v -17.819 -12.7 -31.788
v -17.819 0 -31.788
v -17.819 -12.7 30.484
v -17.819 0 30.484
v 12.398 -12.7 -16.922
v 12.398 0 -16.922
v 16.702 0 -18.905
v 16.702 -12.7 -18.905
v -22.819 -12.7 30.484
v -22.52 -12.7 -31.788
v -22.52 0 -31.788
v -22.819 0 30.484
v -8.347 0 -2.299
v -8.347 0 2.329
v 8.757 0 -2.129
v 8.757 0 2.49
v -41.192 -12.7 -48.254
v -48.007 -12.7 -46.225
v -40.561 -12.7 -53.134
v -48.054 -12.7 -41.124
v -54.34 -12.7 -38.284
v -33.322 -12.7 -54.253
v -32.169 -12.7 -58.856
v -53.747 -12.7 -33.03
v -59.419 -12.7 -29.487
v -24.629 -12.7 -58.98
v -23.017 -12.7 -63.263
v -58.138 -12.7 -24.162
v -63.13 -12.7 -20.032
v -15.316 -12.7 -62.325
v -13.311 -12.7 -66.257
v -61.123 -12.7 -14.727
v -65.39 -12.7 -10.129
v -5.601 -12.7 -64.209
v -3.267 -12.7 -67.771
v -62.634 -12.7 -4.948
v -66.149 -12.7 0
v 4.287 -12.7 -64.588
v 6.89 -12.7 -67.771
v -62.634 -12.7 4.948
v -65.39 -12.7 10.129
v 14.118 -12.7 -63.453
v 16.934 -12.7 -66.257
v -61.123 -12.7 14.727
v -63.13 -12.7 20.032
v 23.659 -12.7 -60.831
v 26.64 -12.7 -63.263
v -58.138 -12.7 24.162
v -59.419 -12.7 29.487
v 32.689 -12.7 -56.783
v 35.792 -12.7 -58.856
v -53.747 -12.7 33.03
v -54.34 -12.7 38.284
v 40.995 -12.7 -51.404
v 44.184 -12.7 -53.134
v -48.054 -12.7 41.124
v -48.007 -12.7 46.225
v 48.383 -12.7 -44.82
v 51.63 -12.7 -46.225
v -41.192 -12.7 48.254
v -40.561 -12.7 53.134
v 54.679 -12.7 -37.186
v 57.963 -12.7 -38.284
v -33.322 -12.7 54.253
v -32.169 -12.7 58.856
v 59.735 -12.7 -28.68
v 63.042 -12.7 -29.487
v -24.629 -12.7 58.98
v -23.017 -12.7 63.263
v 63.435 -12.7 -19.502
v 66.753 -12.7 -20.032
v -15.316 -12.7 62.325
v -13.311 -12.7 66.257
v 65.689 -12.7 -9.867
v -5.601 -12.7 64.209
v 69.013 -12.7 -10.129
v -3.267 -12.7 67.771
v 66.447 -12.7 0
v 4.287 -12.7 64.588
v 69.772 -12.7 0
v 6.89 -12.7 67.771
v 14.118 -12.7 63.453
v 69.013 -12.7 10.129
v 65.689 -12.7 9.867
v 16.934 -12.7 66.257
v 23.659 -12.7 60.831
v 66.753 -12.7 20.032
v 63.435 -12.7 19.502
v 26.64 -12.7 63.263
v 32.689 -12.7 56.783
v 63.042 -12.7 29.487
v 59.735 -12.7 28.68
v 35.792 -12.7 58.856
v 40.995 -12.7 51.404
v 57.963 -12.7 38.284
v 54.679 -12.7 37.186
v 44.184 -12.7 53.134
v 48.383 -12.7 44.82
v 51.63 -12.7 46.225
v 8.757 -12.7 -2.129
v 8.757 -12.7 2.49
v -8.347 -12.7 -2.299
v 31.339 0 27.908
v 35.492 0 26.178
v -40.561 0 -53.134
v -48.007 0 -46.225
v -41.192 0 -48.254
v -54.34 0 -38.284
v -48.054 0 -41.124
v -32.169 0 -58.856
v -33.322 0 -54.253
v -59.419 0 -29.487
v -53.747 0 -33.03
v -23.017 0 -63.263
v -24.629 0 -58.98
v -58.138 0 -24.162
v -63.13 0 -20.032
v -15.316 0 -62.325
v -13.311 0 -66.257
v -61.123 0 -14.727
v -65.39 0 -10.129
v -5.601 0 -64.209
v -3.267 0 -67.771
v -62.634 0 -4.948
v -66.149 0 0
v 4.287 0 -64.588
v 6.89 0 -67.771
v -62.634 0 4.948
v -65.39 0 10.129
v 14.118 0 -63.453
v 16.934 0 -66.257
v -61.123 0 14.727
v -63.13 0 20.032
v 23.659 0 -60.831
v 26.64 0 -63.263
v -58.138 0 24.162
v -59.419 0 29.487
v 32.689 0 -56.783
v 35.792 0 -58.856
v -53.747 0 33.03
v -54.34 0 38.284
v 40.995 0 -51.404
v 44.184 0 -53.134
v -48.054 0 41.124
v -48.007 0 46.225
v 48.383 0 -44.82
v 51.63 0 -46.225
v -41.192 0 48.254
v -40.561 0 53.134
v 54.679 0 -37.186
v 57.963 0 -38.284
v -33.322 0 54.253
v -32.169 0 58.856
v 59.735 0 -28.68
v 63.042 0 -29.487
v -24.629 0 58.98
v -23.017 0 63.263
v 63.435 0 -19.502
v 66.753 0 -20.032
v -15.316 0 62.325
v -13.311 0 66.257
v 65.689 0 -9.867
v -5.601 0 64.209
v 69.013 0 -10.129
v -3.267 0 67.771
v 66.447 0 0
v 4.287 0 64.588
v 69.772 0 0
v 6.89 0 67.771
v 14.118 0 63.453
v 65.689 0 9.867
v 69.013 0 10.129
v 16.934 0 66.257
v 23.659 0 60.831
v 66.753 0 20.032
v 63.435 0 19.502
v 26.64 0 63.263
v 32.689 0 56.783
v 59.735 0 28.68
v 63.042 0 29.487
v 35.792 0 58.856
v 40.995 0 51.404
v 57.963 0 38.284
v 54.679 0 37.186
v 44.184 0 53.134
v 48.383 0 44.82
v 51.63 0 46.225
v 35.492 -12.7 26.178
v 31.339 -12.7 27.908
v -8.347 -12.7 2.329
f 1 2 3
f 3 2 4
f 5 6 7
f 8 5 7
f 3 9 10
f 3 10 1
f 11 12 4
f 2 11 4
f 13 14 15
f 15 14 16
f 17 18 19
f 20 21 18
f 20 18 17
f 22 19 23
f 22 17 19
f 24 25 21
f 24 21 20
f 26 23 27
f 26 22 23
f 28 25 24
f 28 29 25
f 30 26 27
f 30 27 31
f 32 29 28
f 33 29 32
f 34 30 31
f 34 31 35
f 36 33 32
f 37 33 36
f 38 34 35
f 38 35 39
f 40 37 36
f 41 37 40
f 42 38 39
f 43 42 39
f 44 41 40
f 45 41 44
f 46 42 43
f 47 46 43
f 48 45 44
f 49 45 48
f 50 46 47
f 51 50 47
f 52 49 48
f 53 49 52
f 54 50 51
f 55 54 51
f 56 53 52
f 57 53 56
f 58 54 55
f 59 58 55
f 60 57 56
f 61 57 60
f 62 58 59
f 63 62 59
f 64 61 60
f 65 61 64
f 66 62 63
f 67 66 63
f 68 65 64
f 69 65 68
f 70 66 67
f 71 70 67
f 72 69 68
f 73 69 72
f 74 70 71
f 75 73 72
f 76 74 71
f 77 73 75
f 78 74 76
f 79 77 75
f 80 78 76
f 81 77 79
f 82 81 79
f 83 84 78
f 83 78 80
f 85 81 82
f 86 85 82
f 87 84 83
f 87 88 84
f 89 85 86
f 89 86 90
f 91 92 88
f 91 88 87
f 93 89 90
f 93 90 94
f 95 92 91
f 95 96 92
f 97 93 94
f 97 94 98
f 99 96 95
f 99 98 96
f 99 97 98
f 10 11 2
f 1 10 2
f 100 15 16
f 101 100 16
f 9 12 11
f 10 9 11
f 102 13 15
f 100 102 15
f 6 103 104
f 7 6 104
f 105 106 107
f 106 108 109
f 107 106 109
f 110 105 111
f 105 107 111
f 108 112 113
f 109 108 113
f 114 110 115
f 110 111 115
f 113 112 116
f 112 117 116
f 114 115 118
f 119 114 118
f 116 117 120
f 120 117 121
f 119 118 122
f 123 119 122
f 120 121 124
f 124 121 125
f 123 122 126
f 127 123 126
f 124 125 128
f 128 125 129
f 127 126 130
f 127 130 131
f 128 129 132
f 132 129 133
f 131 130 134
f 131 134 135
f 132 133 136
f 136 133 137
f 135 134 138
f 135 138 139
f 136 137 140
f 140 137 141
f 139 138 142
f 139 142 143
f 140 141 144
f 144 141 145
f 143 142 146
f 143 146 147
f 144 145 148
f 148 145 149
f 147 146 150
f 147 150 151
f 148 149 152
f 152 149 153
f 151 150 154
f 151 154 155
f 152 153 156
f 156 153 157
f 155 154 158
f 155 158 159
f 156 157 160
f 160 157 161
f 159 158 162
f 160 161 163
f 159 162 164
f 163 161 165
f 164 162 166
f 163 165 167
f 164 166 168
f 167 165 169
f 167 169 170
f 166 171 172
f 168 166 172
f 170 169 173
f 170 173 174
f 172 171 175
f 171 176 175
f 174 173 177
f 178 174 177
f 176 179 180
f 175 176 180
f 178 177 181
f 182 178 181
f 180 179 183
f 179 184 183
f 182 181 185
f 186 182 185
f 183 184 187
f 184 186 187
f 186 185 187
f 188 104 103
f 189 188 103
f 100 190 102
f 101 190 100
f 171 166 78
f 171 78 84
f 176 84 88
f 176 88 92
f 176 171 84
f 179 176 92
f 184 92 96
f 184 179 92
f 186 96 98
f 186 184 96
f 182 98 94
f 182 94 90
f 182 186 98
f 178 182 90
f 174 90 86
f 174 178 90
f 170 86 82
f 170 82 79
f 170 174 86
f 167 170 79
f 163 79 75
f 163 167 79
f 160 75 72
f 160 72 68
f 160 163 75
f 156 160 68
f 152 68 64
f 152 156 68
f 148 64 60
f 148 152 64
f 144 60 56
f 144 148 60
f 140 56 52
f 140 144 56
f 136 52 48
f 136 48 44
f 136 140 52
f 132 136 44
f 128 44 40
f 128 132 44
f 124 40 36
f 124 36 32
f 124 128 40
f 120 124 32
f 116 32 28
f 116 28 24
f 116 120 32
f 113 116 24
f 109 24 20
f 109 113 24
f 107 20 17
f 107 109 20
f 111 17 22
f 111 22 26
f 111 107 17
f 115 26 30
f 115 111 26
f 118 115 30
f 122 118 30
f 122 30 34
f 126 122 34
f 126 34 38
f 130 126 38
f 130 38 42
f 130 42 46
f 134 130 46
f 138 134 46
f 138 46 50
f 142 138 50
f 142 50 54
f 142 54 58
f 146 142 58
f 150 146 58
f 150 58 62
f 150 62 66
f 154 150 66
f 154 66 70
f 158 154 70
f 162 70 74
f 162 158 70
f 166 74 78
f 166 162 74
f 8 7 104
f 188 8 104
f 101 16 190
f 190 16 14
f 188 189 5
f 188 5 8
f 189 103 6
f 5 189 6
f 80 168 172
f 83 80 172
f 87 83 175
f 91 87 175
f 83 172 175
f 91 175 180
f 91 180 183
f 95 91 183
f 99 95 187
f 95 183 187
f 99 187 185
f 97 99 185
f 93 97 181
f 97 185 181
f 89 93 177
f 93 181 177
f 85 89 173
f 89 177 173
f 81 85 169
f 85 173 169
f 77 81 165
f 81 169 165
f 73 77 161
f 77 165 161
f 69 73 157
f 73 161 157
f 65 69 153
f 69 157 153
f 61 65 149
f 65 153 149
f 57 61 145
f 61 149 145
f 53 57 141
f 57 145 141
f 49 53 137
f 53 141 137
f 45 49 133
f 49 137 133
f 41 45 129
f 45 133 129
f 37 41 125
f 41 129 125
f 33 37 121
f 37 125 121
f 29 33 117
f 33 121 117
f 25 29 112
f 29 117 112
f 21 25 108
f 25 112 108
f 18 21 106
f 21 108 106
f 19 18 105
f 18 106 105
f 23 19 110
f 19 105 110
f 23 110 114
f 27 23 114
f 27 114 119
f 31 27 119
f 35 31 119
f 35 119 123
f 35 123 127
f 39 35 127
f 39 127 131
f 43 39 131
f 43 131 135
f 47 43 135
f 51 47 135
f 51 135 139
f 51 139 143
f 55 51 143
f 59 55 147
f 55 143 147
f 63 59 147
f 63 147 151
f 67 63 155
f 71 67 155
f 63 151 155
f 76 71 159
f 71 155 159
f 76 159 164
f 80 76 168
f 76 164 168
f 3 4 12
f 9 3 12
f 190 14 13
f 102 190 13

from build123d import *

# Parameters (mm, degrees)
F0_R     = 67.960562
F0_R_2   = 64.635228
F1_DEPTH = 12.7


with BuildPart() as f1:
    # F0 (on Front) → F1 (new body)
    with BuildSketch(Plane.XZ):
        with Locations((1.81155, 0)):
            Circle(F0_R)
        with Locations((1.81155, 0)):
            Circle(F0_R_2, mode=Mode.SUBTRACT)
        Polygon((31.339053, 27.908249), (12.39768, -16.922425), (16.702015, -18.904686), (35.491587, 26.177537), align=None)
        Polygon((8.757327, 2.489706), (-8.346742, 2.329292), (-8.346742, -2.298555), (8.757327, -2.128647), align=None)
        Polygon((-17.819123, 30.483615), (-22.818964, 30.483615), (-22.519909, -31.78807), (-17.819123, -31.78807), align=None)
    extrude(amount=F1_DEPTH)


solid = f1.part
